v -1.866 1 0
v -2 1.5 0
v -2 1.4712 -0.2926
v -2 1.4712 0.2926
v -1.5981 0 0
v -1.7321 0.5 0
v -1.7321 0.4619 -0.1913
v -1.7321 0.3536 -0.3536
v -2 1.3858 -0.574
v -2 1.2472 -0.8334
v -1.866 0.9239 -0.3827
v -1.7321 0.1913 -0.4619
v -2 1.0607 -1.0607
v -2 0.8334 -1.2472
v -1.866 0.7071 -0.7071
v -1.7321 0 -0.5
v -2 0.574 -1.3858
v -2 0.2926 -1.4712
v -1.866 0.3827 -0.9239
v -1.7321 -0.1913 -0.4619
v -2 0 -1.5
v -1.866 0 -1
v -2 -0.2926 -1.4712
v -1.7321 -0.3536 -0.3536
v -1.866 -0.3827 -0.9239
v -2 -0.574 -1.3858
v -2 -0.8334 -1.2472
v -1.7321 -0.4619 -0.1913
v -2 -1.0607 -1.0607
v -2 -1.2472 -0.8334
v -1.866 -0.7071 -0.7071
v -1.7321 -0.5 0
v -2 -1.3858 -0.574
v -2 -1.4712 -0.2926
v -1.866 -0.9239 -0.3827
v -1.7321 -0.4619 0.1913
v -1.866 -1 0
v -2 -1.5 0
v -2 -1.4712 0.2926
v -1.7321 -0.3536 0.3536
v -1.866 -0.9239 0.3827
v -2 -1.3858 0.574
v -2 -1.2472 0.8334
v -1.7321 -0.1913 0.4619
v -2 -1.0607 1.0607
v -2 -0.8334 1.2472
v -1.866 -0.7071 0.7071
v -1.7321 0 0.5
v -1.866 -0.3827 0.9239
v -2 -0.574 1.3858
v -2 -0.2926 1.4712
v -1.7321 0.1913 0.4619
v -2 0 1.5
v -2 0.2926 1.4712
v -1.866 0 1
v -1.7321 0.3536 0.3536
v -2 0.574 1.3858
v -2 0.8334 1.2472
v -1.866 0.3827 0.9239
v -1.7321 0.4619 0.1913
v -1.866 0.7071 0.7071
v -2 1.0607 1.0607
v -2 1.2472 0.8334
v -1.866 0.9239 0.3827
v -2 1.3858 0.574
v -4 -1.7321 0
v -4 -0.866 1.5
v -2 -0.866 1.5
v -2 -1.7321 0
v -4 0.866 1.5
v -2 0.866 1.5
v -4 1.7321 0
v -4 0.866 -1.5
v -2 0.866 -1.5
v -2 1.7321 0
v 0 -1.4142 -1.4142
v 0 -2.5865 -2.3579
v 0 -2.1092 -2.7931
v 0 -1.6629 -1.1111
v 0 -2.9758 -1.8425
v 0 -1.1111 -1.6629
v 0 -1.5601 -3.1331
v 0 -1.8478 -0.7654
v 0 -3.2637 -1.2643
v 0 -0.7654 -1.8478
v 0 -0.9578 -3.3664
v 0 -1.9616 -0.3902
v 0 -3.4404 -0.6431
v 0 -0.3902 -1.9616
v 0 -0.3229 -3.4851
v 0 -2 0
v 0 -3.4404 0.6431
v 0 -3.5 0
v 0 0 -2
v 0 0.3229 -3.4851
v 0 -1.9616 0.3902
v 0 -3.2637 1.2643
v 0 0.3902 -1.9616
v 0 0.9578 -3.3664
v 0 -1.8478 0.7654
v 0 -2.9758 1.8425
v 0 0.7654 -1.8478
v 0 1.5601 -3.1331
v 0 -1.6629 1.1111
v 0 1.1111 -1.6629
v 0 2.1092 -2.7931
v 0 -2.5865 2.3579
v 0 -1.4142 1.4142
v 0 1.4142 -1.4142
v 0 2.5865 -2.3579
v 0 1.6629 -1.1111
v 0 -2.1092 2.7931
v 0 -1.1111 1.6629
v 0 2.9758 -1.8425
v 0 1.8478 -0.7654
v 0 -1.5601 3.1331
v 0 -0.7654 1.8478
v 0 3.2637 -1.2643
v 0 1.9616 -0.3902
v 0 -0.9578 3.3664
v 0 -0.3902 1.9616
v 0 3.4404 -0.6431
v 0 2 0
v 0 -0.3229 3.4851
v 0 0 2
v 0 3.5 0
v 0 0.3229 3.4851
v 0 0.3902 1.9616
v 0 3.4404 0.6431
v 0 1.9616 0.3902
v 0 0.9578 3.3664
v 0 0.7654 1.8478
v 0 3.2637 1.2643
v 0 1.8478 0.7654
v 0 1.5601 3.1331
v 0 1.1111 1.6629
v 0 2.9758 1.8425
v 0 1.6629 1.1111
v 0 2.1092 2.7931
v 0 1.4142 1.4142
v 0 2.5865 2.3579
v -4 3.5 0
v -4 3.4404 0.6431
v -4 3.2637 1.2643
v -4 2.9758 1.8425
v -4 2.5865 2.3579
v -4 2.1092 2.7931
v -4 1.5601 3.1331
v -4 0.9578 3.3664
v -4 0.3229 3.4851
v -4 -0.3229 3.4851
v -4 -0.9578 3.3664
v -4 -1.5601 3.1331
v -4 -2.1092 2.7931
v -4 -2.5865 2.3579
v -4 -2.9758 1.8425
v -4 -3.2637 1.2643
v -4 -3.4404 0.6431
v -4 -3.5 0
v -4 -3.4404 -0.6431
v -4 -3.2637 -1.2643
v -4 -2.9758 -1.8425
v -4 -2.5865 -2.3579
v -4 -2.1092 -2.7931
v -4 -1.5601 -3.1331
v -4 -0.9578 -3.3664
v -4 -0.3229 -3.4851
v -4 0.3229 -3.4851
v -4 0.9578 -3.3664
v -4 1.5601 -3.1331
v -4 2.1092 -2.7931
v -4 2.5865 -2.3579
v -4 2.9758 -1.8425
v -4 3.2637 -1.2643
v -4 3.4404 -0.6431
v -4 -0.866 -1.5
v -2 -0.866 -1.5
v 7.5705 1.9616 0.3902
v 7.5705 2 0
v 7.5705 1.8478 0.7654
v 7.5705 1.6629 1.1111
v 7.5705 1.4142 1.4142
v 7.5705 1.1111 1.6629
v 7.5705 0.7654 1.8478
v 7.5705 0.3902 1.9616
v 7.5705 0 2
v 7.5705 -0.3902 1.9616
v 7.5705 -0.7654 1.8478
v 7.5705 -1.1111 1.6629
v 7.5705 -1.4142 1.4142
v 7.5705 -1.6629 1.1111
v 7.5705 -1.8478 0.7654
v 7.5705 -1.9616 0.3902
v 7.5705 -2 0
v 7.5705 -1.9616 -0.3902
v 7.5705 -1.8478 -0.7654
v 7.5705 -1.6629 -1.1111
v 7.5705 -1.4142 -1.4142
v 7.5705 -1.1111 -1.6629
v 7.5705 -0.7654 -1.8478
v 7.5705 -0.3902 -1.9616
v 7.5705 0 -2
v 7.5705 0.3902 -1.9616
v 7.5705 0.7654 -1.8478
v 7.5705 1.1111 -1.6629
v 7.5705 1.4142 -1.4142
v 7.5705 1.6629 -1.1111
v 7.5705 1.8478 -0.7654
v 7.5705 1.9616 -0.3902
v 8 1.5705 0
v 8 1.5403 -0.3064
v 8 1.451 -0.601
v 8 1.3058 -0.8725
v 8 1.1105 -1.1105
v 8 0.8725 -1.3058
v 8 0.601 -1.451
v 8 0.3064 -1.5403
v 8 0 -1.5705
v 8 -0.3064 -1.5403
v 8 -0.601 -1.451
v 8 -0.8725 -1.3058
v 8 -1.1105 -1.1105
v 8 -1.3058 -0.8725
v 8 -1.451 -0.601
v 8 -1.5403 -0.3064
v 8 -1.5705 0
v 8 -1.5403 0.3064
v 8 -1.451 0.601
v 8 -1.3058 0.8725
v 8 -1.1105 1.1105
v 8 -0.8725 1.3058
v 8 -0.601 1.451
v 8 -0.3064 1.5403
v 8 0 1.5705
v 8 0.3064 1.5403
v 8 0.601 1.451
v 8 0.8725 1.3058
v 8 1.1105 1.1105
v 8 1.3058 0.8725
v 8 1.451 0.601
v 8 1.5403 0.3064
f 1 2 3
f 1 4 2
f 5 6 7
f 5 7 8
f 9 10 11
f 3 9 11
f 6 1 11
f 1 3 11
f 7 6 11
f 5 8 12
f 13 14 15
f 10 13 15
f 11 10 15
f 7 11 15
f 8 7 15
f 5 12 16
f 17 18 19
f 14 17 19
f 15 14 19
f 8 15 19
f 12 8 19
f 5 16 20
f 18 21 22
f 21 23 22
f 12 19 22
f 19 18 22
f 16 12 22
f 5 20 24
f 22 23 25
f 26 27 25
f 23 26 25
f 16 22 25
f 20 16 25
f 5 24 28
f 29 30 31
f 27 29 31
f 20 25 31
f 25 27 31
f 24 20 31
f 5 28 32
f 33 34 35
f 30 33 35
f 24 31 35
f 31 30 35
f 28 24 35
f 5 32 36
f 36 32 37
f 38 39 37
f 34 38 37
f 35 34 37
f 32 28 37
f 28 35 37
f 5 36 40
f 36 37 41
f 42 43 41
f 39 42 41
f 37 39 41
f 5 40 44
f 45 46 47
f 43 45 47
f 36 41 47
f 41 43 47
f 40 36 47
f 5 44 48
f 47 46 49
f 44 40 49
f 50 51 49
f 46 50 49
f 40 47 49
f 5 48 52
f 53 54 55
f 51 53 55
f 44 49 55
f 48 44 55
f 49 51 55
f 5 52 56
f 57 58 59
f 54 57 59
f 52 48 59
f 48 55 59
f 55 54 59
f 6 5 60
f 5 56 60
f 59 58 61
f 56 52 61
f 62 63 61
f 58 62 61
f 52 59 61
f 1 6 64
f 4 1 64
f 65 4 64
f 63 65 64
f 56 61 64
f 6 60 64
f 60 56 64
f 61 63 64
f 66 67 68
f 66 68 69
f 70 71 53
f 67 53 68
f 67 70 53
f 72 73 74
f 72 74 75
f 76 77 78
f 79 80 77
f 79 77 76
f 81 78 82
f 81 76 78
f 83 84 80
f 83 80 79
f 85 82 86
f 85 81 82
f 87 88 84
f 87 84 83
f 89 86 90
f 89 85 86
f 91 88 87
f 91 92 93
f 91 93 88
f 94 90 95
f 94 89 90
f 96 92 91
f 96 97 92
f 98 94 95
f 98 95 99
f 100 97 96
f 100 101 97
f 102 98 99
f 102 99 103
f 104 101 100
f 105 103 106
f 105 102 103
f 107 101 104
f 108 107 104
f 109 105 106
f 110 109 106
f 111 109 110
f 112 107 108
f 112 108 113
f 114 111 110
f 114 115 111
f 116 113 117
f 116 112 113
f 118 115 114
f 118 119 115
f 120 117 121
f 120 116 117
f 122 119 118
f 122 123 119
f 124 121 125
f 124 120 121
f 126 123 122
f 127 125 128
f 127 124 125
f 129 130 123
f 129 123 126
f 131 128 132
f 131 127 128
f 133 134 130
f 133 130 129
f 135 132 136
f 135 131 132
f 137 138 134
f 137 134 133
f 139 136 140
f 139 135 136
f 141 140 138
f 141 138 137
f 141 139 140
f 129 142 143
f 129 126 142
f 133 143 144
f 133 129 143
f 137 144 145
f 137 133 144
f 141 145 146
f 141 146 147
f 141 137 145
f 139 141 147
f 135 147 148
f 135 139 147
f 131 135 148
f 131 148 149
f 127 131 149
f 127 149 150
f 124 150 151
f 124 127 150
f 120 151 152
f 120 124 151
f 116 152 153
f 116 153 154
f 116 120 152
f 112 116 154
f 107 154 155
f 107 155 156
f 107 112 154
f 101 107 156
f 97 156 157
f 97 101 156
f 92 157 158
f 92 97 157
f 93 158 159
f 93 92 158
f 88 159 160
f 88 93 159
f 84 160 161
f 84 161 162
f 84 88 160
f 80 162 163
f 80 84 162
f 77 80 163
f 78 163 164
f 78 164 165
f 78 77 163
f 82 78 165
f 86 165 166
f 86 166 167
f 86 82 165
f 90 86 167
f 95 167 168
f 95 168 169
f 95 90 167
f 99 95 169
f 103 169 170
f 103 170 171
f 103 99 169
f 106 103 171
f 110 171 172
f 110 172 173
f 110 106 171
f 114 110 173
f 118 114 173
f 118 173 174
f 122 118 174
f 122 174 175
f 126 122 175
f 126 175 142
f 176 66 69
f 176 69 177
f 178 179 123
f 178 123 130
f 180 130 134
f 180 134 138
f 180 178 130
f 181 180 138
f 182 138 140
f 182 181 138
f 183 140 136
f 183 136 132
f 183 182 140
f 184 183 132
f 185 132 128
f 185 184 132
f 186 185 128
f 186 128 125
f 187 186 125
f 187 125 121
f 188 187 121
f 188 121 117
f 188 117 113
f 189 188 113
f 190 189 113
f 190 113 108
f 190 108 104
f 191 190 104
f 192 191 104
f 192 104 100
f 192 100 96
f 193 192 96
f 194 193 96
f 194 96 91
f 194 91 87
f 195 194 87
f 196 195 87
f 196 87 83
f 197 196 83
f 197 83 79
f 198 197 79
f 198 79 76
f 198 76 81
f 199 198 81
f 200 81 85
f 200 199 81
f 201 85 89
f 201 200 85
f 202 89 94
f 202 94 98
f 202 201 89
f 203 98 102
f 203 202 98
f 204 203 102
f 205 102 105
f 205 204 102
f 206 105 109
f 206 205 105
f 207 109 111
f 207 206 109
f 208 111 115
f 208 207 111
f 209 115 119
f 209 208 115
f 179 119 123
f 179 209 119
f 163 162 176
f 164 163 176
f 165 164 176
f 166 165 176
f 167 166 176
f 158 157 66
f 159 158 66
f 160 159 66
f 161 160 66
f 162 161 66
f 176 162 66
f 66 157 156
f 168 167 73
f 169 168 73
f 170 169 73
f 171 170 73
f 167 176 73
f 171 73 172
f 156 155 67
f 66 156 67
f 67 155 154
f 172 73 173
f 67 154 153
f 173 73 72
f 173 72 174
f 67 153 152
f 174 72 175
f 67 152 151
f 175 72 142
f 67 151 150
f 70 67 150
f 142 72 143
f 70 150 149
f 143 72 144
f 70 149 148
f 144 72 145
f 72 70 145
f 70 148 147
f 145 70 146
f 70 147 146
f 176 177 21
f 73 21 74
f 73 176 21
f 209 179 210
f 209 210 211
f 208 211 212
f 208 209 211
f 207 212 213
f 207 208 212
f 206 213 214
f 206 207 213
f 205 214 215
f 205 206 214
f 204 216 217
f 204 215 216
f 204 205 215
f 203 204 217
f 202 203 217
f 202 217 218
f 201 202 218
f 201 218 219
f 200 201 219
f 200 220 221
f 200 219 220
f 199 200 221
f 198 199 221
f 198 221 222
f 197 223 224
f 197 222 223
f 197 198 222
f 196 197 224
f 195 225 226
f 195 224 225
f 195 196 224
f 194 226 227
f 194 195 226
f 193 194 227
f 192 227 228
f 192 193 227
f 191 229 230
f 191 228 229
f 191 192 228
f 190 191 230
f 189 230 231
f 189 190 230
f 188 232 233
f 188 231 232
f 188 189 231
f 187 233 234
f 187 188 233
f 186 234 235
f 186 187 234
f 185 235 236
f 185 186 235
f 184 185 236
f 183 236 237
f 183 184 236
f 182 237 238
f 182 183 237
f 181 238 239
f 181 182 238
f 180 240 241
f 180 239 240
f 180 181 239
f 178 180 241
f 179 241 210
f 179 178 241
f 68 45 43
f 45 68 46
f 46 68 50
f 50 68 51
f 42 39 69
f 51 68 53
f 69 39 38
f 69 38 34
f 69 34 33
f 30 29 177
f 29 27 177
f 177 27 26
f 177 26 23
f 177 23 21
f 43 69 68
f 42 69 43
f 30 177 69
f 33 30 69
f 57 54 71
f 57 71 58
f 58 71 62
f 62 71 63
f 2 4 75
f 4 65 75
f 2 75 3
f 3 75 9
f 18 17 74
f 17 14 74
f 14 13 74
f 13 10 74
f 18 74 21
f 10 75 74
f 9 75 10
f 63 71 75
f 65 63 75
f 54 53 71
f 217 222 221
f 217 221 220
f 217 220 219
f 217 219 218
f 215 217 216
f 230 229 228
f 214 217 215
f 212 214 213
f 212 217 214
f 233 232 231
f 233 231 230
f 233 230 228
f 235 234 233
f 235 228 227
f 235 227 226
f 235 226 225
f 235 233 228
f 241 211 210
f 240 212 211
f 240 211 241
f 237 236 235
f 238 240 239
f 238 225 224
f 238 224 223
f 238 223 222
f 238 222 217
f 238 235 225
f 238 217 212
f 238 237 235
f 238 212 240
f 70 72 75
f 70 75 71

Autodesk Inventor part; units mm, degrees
sketch "Sketch_1" plane through (0, 0, 0) normal (0, 0, 1) x (1, 0, 0)
  line L0 (8, 0) -> (-4, 0)
  line L1 (-4, 0) -> (-4, 3.5)
  line L2 (-4, 3.5) -> (0, 3.5)
  line L3 (0, 3.5) -> (0, 2)
  line L4 (0, 2) -> (7.5705, 2)
  line L5 (7.5705, 2) -> (8, 1.5705)
  line L6 (8, 1.5705) -> (8, 0)
  line L7 (8, 0) -> (-4, 0)
revolve "Revolution1" add sketch "Sketch_1" angle 360 about axis through (8, 0, 0) along (1, 0, 0)
thread "Thread1" size "M4x0.7" class "6g" standard "ISO Metric profile" length 7.5 offset 0.5
sketch "Sketch_4" plane through (0, 0, 0) normal (0, 0, 1) x (1, 0, 0)
  line L0 (-1.5981, 0) -> (-4, 0)
  line L1 (-4, 0) -> (-4, 1.5)
  line L2 (-4, 1.5) -> (-2, 1.5)
  line L3 (-2, 1.5) -> (-1.5981, 0)
  line L4 (-1.5981, 0) -> (-4, 0)
revolve "Revolution2" cut sketch "Sketch_4" angle 360 about axis through (-1.5981, 0, 0) along (1, 0, 0)
sketch "Sketch_3" plane through (-4, 0, 0) normal (1, 0, 0) x (0, 0, -1)
  line L0 (-1.5, 0.866) -> (-1.5, -0.866)
  line L1 (-1.5, -0.866) -> (0, -1.7321)
  line L2 (0, -1.7321) -> (1.5, -0.866)
  line L3 (1.5, -0.866) -> (1.5, 0.866)
  line L4 (1.5, 0.866) -> (0, 1.7321)
  line L5 (0, 1.7321) -> (-1.5, 0.866)
extrude "Extrusion1" cut sketch "Sketch_3" along normal blind 2
ref_plane "bolt_XY" through (0, 0, 0) normal (1, 0, 0) x (0, 0, -1)
ref_plane "bolt_YZ" through (0, 0, 0) normal (0, 0, -1) x (0, 1, 0)
ref_plane "bolt_ZX" through (0, 0, 0) normal (0, 1, 0) x (1, 0, 0)
ref_plane "nut_XY" through (8, 0, 0) normal (1, 0, 0) x (0, 0, -1)
ref_plane "nut_YZ" through (8, 0, 0) normal (0, 0, -1) x (0, 1, 0)
ref_plane "nut_ZX" through (8, 0, 0) normal (0, 1, 0) x (1, 0, 0)
properties part number "CBM4-8" material "MISUMI"
